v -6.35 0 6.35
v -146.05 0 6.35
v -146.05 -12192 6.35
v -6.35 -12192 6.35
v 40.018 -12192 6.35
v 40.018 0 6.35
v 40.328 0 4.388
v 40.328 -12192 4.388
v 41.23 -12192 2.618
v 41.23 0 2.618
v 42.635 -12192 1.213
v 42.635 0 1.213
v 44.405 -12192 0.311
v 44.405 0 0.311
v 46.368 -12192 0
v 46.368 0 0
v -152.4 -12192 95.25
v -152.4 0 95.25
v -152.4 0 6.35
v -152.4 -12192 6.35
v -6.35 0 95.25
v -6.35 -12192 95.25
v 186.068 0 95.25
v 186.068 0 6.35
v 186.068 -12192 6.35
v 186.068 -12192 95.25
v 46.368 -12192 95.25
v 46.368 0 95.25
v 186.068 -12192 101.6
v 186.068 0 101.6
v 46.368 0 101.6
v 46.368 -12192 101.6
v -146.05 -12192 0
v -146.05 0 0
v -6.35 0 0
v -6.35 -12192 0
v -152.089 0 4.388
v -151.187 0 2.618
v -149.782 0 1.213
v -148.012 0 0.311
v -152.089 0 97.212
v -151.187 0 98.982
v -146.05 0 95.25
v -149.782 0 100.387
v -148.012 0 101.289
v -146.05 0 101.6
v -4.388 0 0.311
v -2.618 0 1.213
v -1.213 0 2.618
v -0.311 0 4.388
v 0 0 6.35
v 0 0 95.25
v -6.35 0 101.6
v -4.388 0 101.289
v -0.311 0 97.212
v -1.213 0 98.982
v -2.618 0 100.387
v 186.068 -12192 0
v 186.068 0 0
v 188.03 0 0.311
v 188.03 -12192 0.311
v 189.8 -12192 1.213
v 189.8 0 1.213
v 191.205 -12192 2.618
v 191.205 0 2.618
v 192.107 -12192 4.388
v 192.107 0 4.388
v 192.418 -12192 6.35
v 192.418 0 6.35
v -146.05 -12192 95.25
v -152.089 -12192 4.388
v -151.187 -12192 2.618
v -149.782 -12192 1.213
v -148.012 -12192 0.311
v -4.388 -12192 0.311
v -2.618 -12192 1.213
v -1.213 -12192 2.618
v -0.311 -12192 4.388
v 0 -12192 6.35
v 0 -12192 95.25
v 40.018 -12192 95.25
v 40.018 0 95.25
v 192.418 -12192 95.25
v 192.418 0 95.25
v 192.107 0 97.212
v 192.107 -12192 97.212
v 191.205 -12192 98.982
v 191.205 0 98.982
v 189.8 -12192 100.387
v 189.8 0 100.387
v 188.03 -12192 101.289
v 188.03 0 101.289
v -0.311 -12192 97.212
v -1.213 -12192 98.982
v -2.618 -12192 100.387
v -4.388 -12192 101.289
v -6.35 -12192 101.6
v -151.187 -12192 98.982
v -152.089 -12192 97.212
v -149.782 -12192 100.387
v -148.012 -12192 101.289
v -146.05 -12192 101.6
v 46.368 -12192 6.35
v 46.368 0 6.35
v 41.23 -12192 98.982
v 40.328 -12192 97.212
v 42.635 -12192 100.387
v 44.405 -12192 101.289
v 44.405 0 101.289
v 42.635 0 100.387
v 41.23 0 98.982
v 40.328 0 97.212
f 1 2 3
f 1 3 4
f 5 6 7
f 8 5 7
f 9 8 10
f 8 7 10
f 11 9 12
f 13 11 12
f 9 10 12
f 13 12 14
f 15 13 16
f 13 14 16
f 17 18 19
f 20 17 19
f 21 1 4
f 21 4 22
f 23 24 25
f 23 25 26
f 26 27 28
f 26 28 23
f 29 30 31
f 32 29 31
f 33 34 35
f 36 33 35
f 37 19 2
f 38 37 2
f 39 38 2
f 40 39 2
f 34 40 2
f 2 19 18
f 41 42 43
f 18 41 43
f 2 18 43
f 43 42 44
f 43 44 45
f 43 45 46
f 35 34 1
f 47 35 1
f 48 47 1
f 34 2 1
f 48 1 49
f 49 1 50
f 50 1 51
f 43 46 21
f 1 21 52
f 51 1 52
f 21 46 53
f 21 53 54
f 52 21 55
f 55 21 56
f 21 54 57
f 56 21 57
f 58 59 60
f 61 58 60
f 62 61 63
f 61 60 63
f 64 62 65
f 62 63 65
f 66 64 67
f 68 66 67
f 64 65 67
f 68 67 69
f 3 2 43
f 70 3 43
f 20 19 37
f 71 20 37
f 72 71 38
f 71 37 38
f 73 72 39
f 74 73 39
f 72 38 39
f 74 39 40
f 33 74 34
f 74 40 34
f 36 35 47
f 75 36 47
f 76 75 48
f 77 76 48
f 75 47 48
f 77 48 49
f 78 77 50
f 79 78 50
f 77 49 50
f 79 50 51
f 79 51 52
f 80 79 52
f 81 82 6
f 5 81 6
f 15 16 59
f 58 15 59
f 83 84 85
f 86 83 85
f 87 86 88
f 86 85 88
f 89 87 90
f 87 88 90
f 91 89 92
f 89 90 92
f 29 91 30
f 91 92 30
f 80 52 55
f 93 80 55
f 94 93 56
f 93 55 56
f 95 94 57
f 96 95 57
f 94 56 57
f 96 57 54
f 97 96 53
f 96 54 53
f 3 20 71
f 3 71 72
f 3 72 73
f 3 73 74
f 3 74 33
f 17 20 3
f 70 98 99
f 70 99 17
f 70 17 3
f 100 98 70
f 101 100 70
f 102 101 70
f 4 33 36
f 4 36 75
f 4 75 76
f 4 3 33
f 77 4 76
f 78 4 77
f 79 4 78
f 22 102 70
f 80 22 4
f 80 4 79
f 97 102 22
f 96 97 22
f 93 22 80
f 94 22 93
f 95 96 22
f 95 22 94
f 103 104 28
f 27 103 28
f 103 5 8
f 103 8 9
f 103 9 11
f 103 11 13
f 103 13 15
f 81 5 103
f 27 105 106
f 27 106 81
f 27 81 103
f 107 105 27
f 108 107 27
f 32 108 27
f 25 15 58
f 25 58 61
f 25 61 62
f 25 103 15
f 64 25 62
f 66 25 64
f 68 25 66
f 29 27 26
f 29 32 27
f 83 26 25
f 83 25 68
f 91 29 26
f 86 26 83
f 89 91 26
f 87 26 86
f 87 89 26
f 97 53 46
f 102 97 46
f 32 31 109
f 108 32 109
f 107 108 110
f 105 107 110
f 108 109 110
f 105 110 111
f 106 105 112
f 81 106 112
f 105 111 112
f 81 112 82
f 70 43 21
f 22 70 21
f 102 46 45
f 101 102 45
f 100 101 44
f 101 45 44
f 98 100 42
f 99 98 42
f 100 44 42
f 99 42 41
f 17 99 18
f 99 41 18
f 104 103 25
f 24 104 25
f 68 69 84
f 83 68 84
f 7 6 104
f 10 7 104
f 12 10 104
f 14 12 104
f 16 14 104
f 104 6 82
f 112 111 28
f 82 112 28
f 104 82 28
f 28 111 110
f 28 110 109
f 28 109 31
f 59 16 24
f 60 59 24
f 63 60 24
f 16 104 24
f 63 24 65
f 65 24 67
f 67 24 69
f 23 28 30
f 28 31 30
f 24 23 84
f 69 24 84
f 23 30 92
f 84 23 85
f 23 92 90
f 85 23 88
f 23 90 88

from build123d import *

# Parameters (mm, degrees)
F0_W     = 139.700003
F0_H     = 88.900003
F0_W_2   = 139.699996
F0_H_2   = 88.899996
F1_DEPTH = 12192


with BuildPart() as f1:
    # F0 (on Front) → F1 (new body)
    with BuildSketch(Plane.XZ):
        with BuildLine():
            Line((-146.05, 0), (-6.35, 0))
            ThreePointArc((-6.35, 0), (-1.859872, 1.859872), (0, 6.35))
            Line((0, 6.35), (0, 95.25))
            ThreePointArc((0, 95.25), (-1.859872, 99.740128), (-6.35, 101.6))
            Line((-6.35, 101.6), (-146.05, 101.6))
            ThreePointArc((-146.05, 101.6), (-150.540128, 99.740128), (-152.4, 95.25))
            Line((-152.4, 95.25), (-152.4, 6.35))
            ThreePointArc((-152.4, 6.35), (-150.540128, 1.859872), (-146.05, 0))
        make_face()
        with Locations((-76.200001, 50.800001)):
            Rectangle(F0_W, F0_H, mode=Mode.SUBTRACT)
        with BuildLine():
            ThreePointArc((40.017502, 6.35), (41.877374, 1.859872), (46.367502, 0))
            Line((46.367502, 0), (186.067502, 0))
            ThreePointArc((186.067502, 0), (190.55763, 1.859872), (192.417502, 6.35))
            Line((192.417502, 6.35), (192.417502, 95.25))
            ThreePointArc((192.417502, 95.25), (190.55763, 99.740128), (186.067502, 101.6))
            Line((186.067502, 101.6), (46.367502, 101.6))
            ThreePointArc((46.367502, 101.6), (41.877374, 99.740128), (40.017502, 95.25))
            Line((40.017502, 95.25), (40.017502, 6.35))
        make_face()
        with Locations((116.217502, 50.8)):
            Rectangle(F0_W_2, F0_H_2, mode=Mode.SUBTRACT)
    extrude(amount=F1_DEPTH)


solid = f1.part
